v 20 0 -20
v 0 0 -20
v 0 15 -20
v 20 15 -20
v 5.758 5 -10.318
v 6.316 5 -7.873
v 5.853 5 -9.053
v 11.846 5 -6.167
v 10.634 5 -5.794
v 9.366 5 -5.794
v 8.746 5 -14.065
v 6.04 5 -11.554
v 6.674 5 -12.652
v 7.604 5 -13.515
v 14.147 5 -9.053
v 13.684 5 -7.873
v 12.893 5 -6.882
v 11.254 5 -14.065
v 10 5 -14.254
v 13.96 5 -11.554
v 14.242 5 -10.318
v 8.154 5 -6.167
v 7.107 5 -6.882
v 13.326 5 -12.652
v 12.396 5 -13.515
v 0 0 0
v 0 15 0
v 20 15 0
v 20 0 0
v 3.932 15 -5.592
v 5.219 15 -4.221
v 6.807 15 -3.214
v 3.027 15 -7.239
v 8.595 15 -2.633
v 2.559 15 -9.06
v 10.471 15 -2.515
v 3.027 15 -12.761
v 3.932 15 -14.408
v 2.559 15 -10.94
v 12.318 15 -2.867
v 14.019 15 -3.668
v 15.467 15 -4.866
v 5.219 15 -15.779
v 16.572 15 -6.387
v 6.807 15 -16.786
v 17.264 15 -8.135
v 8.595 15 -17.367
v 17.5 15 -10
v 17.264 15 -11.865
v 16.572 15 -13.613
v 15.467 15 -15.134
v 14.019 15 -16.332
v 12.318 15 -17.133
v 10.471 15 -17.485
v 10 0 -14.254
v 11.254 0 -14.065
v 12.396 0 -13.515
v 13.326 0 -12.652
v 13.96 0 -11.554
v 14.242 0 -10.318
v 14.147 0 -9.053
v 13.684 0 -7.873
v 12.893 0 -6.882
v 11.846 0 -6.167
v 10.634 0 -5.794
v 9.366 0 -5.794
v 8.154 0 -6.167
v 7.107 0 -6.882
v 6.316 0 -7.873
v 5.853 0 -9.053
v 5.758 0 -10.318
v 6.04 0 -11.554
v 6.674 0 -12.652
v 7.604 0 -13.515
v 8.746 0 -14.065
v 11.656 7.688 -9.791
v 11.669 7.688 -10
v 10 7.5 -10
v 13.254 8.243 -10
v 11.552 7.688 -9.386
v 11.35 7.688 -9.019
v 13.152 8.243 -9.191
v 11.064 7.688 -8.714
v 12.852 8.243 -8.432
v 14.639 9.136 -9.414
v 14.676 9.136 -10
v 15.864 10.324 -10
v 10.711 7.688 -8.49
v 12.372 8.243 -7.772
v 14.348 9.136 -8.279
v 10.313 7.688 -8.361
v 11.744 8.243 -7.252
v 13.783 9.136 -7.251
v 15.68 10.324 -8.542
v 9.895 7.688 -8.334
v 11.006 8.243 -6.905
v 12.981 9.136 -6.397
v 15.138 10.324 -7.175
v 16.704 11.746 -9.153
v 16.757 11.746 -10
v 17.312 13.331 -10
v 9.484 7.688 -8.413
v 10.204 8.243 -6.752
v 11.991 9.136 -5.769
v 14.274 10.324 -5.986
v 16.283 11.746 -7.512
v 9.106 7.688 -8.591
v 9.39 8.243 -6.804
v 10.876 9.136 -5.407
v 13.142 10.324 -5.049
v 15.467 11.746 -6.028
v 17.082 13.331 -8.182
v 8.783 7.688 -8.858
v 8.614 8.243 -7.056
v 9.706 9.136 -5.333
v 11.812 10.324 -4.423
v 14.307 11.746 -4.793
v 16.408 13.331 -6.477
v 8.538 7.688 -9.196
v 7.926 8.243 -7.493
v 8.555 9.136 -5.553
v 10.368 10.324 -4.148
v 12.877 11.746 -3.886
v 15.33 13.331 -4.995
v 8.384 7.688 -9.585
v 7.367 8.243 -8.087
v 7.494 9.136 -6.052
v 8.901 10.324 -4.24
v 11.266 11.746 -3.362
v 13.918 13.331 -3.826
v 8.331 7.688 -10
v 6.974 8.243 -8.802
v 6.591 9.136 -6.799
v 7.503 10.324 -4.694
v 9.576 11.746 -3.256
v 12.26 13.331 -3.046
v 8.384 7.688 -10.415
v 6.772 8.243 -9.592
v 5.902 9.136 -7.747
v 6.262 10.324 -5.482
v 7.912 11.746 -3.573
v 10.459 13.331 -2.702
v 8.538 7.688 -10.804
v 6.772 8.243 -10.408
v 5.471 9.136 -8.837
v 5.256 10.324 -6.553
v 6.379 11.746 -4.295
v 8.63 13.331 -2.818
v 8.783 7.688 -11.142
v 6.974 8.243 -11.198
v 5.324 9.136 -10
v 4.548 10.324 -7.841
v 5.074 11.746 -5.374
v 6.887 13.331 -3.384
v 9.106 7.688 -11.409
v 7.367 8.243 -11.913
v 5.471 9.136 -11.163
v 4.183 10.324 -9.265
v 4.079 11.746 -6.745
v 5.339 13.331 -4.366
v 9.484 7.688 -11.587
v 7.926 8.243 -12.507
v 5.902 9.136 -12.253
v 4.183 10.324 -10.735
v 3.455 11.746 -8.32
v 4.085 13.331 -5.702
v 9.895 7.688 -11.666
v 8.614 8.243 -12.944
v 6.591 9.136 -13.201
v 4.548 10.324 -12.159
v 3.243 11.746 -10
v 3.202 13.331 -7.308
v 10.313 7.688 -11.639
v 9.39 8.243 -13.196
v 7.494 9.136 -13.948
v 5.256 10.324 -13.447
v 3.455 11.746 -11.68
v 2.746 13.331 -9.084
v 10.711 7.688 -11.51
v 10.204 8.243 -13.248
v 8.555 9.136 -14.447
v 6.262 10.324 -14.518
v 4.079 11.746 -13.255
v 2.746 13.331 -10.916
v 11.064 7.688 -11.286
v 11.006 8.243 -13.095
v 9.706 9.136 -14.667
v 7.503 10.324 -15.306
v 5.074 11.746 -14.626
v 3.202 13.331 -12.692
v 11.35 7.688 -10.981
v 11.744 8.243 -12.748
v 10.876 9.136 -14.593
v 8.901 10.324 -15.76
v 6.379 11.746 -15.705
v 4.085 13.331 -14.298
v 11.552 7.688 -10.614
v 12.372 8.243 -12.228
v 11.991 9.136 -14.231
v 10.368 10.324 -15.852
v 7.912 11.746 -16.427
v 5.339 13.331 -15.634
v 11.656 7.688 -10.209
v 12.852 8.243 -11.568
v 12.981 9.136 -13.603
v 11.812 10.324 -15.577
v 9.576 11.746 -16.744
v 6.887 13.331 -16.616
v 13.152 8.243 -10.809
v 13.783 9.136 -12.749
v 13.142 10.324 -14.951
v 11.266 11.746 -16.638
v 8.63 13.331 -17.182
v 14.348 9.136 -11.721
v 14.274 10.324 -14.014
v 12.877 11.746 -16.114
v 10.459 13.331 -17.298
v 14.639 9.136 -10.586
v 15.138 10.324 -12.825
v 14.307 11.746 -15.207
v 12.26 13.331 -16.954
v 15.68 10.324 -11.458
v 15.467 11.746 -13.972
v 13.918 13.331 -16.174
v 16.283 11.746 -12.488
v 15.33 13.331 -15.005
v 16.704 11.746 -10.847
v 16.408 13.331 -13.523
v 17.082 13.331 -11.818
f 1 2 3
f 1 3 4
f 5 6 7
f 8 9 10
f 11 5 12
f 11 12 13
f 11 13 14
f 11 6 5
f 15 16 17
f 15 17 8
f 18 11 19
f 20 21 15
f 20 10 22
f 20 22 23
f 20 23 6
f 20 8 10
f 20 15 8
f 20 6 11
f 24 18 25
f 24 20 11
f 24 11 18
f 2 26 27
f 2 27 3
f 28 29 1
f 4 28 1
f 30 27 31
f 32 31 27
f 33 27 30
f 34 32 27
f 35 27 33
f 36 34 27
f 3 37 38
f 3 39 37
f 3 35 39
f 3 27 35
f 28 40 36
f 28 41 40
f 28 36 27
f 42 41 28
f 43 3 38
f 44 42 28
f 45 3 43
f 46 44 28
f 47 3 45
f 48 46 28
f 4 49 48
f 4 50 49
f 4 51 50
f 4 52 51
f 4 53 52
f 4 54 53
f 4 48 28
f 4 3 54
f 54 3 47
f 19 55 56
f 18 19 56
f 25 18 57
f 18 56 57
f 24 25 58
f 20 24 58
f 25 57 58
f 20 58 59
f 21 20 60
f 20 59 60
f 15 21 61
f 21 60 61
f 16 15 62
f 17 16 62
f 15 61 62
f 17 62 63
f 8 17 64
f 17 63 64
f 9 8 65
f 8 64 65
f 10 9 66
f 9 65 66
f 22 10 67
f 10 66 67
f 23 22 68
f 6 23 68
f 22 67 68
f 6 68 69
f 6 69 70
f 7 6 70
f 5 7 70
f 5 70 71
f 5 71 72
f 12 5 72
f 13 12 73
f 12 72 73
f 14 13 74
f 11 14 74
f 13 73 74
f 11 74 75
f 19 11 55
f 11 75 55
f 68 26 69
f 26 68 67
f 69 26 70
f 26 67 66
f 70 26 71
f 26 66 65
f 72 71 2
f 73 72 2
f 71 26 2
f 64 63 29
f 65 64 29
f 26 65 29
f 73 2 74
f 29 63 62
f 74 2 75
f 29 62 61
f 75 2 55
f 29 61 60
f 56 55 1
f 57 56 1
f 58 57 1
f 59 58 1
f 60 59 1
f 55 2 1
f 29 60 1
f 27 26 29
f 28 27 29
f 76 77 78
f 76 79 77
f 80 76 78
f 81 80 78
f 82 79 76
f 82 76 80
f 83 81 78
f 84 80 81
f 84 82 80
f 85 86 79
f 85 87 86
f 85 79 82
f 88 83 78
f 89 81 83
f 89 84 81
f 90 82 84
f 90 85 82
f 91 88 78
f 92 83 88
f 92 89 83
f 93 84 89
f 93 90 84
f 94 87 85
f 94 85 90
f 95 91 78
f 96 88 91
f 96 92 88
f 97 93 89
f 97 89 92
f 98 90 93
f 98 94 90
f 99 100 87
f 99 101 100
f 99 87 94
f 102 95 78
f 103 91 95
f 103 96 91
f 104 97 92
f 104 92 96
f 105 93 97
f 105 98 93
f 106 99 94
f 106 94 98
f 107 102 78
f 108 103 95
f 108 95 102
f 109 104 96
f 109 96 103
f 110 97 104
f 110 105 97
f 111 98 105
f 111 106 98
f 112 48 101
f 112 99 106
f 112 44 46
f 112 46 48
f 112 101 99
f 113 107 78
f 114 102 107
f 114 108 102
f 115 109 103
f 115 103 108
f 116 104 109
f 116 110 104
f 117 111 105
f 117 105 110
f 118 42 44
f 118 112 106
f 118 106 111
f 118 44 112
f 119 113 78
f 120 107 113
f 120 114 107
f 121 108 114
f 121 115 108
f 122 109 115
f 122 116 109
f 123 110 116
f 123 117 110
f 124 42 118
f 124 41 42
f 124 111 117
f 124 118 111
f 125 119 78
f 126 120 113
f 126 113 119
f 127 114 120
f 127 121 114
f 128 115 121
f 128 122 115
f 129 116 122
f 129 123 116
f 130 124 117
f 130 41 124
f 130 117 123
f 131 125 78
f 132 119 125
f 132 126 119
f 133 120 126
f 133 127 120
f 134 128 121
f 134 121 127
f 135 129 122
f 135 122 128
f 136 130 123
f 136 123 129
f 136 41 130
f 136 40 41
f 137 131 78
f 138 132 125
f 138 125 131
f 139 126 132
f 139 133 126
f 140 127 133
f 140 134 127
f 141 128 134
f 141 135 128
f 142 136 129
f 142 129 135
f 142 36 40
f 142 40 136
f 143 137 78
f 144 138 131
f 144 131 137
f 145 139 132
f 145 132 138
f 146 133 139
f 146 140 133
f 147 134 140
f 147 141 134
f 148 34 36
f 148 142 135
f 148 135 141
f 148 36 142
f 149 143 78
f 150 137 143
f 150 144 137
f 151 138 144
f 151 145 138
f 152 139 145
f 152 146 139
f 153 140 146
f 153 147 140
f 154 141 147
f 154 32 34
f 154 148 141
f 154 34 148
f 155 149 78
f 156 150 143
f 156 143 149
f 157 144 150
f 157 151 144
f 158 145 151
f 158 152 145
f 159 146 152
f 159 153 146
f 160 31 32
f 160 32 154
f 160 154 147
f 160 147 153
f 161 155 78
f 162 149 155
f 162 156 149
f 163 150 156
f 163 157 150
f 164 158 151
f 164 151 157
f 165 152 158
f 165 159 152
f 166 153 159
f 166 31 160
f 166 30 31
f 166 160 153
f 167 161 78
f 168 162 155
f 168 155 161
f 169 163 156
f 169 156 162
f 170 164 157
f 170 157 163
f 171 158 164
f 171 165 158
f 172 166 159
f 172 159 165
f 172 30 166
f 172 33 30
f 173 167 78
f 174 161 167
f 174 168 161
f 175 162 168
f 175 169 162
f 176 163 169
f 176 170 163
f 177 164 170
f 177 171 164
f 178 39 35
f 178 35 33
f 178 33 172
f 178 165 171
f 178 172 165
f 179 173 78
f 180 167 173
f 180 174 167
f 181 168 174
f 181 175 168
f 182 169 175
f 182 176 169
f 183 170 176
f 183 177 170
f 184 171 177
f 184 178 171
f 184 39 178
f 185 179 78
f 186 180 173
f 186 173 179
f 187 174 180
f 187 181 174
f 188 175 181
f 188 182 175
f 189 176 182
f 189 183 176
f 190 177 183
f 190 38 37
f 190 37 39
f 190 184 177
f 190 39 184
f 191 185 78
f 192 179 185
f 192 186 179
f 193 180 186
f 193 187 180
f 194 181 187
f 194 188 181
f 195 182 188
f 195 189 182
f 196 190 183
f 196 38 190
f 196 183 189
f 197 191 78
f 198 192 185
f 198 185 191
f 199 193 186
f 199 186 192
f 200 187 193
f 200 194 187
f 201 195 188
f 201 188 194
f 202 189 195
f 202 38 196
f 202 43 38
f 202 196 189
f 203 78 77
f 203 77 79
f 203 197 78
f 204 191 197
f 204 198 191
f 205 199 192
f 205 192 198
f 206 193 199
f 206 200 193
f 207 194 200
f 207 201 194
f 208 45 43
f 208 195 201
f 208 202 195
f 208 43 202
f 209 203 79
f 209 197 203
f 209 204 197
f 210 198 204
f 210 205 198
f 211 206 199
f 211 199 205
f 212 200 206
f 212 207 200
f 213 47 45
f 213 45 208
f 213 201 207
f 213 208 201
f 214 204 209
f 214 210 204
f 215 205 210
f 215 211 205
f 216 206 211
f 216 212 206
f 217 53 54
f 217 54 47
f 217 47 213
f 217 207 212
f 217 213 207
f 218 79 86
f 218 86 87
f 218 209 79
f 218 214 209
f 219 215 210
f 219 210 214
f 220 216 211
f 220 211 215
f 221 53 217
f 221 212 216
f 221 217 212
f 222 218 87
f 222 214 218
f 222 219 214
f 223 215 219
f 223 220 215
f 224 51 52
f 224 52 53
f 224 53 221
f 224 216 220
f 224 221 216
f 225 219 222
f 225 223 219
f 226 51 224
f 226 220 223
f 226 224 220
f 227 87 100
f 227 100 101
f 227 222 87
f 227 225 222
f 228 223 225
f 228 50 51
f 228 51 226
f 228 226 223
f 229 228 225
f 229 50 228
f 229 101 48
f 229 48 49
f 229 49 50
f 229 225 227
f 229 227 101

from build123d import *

# Parameters (mm, degrees)
SKETCH1_W           = 20
SKETCH1_H           = 20
BOSS_EXTRUDE1_DEPTH = 15
SKETCH5_R           = 4.2540047
CUT_EXTRUDE1_DEPTH  = 5


with BuildPart() as part:
    # Sketch1 → Boss-Extrude1 (new body)
    with BuildSketch(Plane(origin=(0, 0, 0), x_dir=(1, 0, 0), z_dir=(0, 1, 0))):
        with Locations((10, 10)):
            Rectangle(SKETCH1_W, SKETCH1_H)
    extrude(amount=BOSS_EXTRUDE1_DEPTH)

    # Sketch4 → Cut-Revolve7 (revolve, cut)
    with BuildSketch(Plane.XY.offset(-10)):
        with BuildLine():
            Line((10, 22.5), (10, 7.5))
            ThreePointArc((10, 7.5), (17.5, 15), (10, 22.5))
        make_face()
    revolve(axis=Axis((10, 22.5, -10), (0, -1, 0)), mode=Mode.SUBTRACT)

    # Sketch5 → Cut-Extrude1 (cut)
    with BuildSketch(Plane.XZ):
        with Locations(Location((10, -10, 0), (0, 0, 270))):
            Circle(SKETCH5_R)
    extrude(amount=-CUT_EXTRUDE1_DEPTH, mode=Mode.SUBTRACT)


solid = part.part
